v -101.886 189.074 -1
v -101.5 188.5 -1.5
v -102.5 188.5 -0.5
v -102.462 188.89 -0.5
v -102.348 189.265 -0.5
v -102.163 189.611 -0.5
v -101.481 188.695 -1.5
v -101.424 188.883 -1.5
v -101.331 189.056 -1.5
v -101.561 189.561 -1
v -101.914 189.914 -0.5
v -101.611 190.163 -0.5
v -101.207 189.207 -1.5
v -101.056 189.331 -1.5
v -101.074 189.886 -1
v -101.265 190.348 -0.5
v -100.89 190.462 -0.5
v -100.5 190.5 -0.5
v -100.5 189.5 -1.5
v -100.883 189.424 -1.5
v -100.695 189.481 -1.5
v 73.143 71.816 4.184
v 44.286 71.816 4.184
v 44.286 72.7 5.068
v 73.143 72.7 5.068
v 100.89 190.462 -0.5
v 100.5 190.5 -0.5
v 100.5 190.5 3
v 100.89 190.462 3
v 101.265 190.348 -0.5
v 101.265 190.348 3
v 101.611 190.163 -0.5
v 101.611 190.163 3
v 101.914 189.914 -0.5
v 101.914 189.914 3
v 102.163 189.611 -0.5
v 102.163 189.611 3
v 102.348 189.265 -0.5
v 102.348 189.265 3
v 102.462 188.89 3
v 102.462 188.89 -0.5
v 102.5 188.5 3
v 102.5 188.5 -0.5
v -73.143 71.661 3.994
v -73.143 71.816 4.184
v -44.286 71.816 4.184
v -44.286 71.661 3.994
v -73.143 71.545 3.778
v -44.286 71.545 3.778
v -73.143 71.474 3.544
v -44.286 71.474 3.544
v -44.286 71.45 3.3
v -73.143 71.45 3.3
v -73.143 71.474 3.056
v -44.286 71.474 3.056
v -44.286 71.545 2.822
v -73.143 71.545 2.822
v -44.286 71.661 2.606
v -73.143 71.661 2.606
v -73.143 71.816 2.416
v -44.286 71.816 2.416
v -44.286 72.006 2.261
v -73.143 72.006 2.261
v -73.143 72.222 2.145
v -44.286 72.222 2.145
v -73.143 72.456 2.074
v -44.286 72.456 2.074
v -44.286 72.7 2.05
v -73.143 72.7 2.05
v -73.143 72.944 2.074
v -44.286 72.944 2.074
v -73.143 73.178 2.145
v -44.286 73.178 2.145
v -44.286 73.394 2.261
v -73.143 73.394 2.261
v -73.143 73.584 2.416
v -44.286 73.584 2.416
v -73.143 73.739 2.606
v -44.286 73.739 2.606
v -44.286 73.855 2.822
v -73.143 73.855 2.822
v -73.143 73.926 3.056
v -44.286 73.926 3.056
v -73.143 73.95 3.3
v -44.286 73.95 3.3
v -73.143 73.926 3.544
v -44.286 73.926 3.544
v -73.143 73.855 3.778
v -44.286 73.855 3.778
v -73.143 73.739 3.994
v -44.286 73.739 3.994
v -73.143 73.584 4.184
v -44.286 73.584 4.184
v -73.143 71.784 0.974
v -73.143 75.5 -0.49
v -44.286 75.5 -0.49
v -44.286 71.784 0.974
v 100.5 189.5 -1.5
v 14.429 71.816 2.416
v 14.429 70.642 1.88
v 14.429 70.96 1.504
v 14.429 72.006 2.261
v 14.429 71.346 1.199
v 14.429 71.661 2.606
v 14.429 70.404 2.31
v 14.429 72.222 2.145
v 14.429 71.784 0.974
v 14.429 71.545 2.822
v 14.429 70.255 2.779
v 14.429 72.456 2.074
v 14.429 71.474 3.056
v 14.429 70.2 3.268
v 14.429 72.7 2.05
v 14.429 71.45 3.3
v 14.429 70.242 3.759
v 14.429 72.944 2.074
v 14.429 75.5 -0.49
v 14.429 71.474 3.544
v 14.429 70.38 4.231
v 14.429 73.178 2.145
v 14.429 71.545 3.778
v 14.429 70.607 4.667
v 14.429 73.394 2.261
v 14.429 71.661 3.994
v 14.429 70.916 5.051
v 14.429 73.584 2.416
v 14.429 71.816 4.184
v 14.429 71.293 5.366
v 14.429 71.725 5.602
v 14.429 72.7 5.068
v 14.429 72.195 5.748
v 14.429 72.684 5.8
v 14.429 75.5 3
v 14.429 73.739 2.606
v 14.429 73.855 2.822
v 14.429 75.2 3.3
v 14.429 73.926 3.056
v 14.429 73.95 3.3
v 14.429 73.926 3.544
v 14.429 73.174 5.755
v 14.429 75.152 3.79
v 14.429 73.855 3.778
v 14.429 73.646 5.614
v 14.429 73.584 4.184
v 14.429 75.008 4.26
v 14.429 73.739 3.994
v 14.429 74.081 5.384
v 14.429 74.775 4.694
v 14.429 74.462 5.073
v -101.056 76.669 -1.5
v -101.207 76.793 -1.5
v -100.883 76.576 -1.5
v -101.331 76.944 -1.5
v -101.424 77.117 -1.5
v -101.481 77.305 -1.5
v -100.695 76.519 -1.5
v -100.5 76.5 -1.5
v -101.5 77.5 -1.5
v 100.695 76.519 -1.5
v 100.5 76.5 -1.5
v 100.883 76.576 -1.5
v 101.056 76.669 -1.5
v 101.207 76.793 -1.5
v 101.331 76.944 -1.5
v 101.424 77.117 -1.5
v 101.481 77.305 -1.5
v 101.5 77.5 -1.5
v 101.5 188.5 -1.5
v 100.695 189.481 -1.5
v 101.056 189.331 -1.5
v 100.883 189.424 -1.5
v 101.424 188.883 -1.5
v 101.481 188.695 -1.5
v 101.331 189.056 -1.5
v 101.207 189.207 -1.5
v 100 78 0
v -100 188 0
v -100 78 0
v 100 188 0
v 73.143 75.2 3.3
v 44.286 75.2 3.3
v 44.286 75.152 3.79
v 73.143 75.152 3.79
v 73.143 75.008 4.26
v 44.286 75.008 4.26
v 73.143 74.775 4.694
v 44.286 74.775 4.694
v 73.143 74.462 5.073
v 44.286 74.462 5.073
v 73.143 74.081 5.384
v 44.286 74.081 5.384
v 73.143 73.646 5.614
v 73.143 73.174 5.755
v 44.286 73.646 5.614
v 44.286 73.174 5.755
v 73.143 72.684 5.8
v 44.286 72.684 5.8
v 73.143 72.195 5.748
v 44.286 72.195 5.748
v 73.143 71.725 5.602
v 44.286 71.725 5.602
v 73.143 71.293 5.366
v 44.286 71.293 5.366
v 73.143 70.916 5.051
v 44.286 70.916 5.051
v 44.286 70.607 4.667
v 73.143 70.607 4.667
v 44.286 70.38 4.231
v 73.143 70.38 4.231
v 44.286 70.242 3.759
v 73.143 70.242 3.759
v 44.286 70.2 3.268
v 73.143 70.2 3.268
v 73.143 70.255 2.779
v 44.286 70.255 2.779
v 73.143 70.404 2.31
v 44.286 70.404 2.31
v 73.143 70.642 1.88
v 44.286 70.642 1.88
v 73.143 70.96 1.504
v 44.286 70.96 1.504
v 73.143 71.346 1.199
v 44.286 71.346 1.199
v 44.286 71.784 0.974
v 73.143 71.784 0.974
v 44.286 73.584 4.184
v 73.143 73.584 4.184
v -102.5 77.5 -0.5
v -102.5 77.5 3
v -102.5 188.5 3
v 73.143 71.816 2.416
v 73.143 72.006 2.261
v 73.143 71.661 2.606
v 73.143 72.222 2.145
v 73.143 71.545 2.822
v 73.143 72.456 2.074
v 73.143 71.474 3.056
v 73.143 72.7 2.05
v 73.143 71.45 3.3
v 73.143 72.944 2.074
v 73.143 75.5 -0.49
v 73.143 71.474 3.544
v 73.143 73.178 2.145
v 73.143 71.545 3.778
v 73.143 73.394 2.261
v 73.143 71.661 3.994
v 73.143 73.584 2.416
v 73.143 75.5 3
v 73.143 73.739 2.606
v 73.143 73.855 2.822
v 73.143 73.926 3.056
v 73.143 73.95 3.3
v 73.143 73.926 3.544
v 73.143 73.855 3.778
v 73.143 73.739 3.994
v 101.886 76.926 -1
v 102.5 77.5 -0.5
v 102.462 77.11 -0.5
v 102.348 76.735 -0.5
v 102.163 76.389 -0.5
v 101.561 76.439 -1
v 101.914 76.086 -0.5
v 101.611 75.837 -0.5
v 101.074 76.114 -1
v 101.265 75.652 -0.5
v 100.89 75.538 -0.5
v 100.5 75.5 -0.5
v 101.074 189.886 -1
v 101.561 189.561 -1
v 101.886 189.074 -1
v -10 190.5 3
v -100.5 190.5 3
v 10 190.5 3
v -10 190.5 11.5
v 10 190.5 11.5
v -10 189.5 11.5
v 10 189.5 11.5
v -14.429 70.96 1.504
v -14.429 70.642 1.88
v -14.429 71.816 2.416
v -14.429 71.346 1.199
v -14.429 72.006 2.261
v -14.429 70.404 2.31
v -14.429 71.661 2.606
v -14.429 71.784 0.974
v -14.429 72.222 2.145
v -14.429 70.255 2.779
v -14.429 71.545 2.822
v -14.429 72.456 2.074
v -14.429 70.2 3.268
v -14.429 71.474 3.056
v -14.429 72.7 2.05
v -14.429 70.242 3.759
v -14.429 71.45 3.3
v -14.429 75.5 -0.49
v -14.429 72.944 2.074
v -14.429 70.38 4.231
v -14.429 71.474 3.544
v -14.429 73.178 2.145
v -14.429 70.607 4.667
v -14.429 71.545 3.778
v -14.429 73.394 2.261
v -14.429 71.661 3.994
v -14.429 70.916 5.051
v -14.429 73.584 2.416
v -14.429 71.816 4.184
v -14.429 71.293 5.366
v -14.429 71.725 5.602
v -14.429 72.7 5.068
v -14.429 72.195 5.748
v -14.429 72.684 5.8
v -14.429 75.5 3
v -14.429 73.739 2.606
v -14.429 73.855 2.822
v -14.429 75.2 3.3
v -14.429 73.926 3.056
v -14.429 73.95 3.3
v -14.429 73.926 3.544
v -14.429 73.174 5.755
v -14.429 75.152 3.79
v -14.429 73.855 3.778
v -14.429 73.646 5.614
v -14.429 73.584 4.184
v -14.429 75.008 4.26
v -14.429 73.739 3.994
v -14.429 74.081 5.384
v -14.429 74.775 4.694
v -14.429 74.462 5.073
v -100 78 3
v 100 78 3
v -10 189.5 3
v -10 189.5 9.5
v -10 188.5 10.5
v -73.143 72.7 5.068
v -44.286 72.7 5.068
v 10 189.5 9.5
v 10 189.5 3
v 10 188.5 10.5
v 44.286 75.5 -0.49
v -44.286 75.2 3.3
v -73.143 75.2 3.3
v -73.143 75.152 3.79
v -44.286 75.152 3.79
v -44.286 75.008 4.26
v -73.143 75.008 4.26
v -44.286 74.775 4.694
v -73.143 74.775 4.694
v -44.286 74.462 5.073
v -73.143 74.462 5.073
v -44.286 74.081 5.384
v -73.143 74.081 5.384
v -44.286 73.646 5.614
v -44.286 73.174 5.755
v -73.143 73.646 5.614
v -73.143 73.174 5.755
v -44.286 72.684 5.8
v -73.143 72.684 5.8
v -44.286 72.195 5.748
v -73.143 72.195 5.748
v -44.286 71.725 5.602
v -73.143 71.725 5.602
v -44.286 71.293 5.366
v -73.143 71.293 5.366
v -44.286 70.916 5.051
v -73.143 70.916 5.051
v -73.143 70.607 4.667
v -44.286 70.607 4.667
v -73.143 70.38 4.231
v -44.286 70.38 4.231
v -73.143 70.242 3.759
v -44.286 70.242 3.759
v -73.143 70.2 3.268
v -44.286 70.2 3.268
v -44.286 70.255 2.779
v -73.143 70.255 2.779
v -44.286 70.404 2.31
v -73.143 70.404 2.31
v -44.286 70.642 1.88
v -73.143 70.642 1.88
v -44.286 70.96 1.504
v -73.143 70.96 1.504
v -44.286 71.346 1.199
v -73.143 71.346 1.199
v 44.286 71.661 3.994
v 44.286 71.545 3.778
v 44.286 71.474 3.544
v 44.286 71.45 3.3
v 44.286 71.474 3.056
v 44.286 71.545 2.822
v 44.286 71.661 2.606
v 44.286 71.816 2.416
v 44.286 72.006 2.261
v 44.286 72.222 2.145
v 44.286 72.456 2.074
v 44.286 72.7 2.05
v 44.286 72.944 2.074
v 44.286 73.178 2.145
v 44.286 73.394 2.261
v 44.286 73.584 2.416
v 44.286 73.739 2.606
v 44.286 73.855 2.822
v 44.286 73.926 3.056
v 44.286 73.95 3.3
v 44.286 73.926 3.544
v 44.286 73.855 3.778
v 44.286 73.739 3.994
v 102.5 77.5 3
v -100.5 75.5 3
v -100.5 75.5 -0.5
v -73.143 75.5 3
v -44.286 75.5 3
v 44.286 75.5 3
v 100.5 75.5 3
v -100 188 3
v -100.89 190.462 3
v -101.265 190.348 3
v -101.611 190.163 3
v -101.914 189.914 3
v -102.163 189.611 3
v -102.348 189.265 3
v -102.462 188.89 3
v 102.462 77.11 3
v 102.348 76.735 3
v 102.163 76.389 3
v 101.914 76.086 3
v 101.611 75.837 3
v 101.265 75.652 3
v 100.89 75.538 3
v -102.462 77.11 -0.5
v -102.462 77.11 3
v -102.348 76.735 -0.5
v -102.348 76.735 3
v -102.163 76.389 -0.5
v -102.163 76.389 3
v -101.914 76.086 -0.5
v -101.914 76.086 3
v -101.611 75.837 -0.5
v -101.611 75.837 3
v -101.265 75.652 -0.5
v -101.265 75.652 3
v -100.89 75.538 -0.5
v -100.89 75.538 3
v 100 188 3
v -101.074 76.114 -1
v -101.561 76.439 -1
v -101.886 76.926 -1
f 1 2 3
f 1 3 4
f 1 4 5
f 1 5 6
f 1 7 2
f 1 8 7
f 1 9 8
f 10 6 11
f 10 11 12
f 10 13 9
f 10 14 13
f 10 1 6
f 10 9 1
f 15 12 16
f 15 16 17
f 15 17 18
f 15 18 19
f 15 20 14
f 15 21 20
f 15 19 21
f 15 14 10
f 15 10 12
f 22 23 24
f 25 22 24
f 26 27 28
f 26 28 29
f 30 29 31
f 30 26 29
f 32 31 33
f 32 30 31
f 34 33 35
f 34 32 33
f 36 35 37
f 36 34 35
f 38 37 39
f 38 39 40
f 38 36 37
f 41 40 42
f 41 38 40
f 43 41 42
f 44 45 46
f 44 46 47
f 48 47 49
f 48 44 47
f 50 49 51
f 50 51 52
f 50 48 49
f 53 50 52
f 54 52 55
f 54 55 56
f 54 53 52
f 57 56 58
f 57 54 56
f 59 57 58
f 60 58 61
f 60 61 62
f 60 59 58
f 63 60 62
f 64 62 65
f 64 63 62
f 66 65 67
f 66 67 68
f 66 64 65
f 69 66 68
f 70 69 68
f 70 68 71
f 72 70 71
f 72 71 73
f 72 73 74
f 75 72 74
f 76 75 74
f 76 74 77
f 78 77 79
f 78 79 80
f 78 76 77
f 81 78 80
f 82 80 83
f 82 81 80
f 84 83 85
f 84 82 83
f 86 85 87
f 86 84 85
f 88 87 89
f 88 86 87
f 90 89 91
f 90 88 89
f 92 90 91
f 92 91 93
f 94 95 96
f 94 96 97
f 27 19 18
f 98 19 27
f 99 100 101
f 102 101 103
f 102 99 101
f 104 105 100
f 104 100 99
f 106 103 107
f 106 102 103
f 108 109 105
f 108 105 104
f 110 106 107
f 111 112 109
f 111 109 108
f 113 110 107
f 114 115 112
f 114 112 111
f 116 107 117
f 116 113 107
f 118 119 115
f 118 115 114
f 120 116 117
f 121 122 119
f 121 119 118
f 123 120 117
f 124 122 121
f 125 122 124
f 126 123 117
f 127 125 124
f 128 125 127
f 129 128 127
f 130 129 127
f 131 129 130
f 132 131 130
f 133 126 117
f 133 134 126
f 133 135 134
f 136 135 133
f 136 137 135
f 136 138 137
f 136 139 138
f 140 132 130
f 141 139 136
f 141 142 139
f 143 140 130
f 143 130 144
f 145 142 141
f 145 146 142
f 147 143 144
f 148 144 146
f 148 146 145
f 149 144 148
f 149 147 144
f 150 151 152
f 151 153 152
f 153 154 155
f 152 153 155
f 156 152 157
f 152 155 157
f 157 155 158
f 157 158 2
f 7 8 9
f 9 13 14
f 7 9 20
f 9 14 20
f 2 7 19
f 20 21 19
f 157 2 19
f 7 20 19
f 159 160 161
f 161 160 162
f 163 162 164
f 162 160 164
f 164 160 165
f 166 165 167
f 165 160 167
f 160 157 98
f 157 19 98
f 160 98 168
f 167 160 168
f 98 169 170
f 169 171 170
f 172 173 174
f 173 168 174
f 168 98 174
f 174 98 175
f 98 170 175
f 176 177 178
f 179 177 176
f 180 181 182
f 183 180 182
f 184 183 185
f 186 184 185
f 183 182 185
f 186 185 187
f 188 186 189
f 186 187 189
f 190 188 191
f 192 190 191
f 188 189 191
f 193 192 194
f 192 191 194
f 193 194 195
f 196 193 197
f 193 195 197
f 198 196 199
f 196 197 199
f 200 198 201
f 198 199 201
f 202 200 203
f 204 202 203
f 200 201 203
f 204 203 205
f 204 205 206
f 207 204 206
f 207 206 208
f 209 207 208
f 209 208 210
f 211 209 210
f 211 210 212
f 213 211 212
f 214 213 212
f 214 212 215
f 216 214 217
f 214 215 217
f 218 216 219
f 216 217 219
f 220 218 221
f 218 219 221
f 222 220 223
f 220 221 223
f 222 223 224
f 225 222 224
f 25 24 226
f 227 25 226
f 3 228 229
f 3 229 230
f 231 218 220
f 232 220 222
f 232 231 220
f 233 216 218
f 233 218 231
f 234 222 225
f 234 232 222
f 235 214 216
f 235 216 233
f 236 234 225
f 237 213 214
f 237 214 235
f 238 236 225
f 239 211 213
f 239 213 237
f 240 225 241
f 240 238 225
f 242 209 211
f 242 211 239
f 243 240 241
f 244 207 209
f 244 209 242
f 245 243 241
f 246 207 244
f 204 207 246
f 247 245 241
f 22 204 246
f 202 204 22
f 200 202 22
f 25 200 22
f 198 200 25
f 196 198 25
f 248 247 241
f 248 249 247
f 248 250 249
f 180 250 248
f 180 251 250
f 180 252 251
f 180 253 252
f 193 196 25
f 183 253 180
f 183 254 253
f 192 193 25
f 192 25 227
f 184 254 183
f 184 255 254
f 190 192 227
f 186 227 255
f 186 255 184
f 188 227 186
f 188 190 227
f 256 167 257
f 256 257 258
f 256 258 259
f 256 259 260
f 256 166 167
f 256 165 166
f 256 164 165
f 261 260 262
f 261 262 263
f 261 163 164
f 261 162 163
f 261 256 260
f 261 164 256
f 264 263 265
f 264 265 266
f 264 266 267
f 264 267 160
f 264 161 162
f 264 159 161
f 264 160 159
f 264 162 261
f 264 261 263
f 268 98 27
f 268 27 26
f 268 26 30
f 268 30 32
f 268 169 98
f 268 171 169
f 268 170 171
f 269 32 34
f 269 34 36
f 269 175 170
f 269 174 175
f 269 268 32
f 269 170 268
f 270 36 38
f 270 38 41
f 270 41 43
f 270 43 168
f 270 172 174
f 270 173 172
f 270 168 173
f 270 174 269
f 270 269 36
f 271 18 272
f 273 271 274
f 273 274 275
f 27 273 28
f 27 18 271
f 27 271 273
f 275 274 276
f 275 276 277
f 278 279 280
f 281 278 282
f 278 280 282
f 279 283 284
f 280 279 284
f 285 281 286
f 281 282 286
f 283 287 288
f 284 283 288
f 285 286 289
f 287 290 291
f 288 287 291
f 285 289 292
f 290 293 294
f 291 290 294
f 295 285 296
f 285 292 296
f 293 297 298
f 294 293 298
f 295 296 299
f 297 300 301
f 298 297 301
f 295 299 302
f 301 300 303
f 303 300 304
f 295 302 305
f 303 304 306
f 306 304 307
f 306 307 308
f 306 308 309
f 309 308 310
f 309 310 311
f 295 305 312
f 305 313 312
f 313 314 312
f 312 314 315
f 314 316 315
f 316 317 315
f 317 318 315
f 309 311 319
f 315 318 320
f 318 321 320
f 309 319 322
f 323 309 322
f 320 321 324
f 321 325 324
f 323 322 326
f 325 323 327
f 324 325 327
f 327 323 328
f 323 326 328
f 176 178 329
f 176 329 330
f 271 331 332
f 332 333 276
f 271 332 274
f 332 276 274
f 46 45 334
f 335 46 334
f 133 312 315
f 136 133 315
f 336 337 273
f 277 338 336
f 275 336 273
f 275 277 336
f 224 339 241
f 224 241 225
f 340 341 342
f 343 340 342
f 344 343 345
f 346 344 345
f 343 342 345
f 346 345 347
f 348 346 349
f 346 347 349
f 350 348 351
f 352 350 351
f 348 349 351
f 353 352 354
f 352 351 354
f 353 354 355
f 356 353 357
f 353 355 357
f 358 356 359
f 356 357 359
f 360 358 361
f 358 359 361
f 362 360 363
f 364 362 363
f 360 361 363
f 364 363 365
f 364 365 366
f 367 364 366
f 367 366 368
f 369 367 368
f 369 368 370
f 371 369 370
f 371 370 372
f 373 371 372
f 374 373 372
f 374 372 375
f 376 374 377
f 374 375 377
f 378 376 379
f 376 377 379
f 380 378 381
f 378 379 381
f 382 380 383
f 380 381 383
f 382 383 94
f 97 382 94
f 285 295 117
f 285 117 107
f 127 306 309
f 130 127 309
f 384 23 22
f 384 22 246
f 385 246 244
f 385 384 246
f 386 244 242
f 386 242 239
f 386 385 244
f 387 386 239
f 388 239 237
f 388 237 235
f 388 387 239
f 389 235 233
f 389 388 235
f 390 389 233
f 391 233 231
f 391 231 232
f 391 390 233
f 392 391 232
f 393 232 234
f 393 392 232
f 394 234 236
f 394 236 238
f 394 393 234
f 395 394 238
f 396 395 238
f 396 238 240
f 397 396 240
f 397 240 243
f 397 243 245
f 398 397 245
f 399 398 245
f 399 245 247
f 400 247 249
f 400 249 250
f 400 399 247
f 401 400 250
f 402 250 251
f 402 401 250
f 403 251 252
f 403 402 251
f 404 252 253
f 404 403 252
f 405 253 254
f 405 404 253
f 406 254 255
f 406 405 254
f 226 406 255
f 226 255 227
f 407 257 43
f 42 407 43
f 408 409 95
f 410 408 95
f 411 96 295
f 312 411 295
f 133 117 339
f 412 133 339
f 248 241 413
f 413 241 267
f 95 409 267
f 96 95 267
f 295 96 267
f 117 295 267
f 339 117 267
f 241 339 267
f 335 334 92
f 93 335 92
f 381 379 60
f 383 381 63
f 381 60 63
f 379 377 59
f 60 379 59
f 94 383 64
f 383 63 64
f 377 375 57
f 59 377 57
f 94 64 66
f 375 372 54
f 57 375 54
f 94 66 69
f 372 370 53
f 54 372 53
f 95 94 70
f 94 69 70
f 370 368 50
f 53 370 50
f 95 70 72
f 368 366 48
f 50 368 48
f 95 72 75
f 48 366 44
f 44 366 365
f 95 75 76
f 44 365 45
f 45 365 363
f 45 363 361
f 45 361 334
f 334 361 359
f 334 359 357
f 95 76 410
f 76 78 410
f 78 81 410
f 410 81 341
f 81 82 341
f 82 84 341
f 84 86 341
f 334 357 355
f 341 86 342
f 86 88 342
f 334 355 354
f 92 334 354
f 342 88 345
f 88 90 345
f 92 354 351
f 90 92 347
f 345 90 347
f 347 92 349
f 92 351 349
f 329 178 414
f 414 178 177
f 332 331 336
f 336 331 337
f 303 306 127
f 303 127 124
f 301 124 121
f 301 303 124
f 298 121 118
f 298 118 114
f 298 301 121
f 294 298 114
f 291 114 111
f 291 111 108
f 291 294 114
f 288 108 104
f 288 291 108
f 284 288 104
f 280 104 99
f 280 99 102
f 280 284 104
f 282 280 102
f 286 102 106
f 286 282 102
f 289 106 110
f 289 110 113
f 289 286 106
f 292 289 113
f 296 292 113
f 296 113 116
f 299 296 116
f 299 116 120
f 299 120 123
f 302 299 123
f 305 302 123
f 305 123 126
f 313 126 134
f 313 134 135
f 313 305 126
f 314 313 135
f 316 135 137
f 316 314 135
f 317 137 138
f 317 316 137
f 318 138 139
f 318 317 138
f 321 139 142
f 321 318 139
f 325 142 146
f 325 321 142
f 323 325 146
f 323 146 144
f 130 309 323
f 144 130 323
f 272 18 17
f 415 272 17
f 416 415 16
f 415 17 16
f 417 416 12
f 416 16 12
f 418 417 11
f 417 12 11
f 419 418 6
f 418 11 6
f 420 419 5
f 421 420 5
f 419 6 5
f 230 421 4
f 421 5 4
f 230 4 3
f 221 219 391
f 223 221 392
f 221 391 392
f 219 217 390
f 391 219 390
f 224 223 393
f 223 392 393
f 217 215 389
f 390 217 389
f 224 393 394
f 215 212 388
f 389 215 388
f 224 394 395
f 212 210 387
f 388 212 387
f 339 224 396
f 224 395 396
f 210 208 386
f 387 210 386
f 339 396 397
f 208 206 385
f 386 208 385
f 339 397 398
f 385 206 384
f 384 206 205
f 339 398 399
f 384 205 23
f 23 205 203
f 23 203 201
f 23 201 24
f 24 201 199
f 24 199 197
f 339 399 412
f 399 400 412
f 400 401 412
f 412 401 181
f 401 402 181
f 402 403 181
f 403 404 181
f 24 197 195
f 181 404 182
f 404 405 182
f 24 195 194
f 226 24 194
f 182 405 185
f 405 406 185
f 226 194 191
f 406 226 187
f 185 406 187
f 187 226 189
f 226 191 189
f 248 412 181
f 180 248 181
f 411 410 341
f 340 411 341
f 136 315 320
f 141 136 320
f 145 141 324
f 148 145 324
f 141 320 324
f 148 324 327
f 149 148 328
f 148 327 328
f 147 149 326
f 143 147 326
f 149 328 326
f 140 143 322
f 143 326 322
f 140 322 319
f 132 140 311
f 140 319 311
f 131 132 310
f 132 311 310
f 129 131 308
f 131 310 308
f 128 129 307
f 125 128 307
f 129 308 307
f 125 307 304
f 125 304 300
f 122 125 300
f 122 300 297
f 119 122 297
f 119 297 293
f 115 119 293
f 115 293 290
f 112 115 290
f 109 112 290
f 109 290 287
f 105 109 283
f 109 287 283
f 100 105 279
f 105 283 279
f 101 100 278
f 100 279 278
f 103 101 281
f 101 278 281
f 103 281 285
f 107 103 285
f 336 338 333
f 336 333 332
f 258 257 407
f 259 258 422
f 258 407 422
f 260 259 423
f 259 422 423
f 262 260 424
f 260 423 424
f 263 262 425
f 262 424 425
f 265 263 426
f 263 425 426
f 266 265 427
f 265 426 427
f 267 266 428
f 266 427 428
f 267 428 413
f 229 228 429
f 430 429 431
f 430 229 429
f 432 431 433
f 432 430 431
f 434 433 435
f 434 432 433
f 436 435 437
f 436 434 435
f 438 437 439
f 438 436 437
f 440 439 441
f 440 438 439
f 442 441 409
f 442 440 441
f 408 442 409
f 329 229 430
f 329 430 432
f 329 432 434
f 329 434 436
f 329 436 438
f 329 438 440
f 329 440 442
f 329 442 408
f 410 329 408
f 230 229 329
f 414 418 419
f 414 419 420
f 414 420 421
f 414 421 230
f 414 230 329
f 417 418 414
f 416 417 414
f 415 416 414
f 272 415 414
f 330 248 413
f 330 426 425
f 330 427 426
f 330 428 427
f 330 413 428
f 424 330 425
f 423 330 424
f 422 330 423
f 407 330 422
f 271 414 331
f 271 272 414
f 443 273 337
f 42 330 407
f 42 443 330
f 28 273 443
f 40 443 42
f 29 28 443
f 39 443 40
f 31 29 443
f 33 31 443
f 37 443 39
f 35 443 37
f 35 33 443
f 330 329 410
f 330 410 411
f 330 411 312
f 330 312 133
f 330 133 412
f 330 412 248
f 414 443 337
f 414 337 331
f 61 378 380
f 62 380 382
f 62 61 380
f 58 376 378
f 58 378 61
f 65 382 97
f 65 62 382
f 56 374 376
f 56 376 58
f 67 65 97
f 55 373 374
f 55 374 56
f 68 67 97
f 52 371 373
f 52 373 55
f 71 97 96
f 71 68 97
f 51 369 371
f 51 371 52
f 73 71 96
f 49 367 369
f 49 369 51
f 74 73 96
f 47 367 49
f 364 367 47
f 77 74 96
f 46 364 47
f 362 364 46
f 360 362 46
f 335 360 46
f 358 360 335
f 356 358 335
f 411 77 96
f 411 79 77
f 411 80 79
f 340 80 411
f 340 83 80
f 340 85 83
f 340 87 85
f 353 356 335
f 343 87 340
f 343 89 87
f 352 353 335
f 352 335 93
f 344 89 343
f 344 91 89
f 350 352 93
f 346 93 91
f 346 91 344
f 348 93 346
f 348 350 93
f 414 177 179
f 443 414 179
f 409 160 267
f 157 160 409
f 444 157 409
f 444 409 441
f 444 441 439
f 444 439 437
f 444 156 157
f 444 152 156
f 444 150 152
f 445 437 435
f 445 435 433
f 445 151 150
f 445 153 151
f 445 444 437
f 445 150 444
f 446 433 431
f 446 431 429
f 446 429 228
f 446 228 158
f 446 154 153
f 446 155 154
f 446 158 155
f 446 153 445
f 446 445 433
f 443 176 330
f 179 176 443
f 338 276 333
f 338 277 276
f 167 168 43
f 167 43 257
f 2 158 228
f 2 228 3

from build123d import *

# Parameters (mm, degrees)
SKETCH002_W            = 205
SKETCH002_H            = 115
PAD003_DEPTH           = 1.5
SKETCH003_W            = 205
SKETCH003_H            = 115
SKETCH003_W_2          = 200
SKETCH003_H_2          = 110
PAD002_DEPTH           = 3
SKETCH006_W            = 20
SKETCH006_H            = 1
PAD005_DEPTH           = 8.5
PAD006_DEPTH           = 10
PAD008_DEPTH           = 28.857143
LINEARPATTERN001_COUNT = 3
LINEARPATTERN001_PITCH = 58.714286
FILLET001_R            = 2
CHAMFER001_SIZE        = 1


with BuildPart() as part:
    # Sketch002 → Pad003 (new body)
    with BuildSketch(Plane.XY):
        Rectangle(SKETCH002_W, SKETCH002_H)
    extrude(amount=-PAD003_DEPTH)

    # Sketch003 → Pad002 (join)
    with BuildSketch(Plane.XY):
        Rectangle(SKETCH003_W, SKETCH003_H)
        Rectangle(SKETCH003_W_2, SKETCH003_H_2, mode=Mode.SUBTRACT)
    extrude(amount=PAD002_DEPTH)

    # Sketch006 → Pad005 (join)
    with BuildSketch(Plane.XY.offset(3)):
        with Locations((0, 57)):
            Rectangle(SKETCH006_W, SKETCH006_H)
    extrude(amount=PAD005_DEPTH)

    # Sketch007 → Pad006 (join, symmetric)
    with BuildSketch(Plane.YZ):
        Polygon((56.5, 11.5), (55.5, 10.5), (56.5, 9.5), align=None)
    extrude(amount=PAD006_DEPTH, both=True)

    # Sketch009 → Pad008 (join)
    with BuildSketch(Plane.YZ.offset(-73.142857)):
        with BuildLine():
            Line((-57.5, 3), (-57.8, 3.3))
            ThreePointArc((-57.8, 3.3), (-61.706992, 5.366488), (-61.216299, 0.973974))
            Line((-57.5, -0.49), (-61.216299, 0.973974))
            Line((-57.5, 3), (-57.5, -0.49))
        make_face()
        with BuildLine():
            Line((-61.183875, 4.183892), (-60.3, 5.067767))
            Line((-60.3, 5.067767), (-59.416106, 4.183873))
            ThreePointArc((-61.183875, 4.183892), (-60.300013, 2.05), (-59.416106, 4.183873))
        make_face(mode=Mode.SUBTRACT)
    pad008 = extrude(amount=PAD008_DEPTH)

    # LinearPattern001: Pad008 ×3
    with Locations(*[(i * LINEARPATTERN001_PITCH, 0, 0) for i in range(1, LINEARPATTERN001_COUNT)]):
        add(pad008)

    # Fillet001
    fillet001_edges = [part.edges().sort_by_distance(p)[0] for p in [
        (102.5, -57.5, 0.75),
        (102.5, 57.5, 0.75),
        (-102.5, 57.5, 0.75),
        (-102.5, -57.5, 0.75),
    ]]
    fillet(fillet001_edges, radius=FILLET001_R)

    # Chamfer001
    chamfer001_edges = [part.edges().sort_by_distance(p)[0] for p in [
        (0, 57.5, -1.5),
        (-101.914214, 56.914214, -1.5),
        (101.914214, 56.914214, -1.5),
        (-102.5, 0, -1.5),
        (102.5, 0, -1.5),
        (-101.914214, -56.914214, -1.5),
        (101.914214, -56.914214, -1.5),
        (0, -57.5, -1.5),
    ]]
    chamfer(chamfer001_edges, length=CHAMFER001_SIZE)


with BuildPart() as part_1:
    # Body001 placement: moved
    add(part.part.moved(Location((0, 133, 0))))


solid = part_1.part
